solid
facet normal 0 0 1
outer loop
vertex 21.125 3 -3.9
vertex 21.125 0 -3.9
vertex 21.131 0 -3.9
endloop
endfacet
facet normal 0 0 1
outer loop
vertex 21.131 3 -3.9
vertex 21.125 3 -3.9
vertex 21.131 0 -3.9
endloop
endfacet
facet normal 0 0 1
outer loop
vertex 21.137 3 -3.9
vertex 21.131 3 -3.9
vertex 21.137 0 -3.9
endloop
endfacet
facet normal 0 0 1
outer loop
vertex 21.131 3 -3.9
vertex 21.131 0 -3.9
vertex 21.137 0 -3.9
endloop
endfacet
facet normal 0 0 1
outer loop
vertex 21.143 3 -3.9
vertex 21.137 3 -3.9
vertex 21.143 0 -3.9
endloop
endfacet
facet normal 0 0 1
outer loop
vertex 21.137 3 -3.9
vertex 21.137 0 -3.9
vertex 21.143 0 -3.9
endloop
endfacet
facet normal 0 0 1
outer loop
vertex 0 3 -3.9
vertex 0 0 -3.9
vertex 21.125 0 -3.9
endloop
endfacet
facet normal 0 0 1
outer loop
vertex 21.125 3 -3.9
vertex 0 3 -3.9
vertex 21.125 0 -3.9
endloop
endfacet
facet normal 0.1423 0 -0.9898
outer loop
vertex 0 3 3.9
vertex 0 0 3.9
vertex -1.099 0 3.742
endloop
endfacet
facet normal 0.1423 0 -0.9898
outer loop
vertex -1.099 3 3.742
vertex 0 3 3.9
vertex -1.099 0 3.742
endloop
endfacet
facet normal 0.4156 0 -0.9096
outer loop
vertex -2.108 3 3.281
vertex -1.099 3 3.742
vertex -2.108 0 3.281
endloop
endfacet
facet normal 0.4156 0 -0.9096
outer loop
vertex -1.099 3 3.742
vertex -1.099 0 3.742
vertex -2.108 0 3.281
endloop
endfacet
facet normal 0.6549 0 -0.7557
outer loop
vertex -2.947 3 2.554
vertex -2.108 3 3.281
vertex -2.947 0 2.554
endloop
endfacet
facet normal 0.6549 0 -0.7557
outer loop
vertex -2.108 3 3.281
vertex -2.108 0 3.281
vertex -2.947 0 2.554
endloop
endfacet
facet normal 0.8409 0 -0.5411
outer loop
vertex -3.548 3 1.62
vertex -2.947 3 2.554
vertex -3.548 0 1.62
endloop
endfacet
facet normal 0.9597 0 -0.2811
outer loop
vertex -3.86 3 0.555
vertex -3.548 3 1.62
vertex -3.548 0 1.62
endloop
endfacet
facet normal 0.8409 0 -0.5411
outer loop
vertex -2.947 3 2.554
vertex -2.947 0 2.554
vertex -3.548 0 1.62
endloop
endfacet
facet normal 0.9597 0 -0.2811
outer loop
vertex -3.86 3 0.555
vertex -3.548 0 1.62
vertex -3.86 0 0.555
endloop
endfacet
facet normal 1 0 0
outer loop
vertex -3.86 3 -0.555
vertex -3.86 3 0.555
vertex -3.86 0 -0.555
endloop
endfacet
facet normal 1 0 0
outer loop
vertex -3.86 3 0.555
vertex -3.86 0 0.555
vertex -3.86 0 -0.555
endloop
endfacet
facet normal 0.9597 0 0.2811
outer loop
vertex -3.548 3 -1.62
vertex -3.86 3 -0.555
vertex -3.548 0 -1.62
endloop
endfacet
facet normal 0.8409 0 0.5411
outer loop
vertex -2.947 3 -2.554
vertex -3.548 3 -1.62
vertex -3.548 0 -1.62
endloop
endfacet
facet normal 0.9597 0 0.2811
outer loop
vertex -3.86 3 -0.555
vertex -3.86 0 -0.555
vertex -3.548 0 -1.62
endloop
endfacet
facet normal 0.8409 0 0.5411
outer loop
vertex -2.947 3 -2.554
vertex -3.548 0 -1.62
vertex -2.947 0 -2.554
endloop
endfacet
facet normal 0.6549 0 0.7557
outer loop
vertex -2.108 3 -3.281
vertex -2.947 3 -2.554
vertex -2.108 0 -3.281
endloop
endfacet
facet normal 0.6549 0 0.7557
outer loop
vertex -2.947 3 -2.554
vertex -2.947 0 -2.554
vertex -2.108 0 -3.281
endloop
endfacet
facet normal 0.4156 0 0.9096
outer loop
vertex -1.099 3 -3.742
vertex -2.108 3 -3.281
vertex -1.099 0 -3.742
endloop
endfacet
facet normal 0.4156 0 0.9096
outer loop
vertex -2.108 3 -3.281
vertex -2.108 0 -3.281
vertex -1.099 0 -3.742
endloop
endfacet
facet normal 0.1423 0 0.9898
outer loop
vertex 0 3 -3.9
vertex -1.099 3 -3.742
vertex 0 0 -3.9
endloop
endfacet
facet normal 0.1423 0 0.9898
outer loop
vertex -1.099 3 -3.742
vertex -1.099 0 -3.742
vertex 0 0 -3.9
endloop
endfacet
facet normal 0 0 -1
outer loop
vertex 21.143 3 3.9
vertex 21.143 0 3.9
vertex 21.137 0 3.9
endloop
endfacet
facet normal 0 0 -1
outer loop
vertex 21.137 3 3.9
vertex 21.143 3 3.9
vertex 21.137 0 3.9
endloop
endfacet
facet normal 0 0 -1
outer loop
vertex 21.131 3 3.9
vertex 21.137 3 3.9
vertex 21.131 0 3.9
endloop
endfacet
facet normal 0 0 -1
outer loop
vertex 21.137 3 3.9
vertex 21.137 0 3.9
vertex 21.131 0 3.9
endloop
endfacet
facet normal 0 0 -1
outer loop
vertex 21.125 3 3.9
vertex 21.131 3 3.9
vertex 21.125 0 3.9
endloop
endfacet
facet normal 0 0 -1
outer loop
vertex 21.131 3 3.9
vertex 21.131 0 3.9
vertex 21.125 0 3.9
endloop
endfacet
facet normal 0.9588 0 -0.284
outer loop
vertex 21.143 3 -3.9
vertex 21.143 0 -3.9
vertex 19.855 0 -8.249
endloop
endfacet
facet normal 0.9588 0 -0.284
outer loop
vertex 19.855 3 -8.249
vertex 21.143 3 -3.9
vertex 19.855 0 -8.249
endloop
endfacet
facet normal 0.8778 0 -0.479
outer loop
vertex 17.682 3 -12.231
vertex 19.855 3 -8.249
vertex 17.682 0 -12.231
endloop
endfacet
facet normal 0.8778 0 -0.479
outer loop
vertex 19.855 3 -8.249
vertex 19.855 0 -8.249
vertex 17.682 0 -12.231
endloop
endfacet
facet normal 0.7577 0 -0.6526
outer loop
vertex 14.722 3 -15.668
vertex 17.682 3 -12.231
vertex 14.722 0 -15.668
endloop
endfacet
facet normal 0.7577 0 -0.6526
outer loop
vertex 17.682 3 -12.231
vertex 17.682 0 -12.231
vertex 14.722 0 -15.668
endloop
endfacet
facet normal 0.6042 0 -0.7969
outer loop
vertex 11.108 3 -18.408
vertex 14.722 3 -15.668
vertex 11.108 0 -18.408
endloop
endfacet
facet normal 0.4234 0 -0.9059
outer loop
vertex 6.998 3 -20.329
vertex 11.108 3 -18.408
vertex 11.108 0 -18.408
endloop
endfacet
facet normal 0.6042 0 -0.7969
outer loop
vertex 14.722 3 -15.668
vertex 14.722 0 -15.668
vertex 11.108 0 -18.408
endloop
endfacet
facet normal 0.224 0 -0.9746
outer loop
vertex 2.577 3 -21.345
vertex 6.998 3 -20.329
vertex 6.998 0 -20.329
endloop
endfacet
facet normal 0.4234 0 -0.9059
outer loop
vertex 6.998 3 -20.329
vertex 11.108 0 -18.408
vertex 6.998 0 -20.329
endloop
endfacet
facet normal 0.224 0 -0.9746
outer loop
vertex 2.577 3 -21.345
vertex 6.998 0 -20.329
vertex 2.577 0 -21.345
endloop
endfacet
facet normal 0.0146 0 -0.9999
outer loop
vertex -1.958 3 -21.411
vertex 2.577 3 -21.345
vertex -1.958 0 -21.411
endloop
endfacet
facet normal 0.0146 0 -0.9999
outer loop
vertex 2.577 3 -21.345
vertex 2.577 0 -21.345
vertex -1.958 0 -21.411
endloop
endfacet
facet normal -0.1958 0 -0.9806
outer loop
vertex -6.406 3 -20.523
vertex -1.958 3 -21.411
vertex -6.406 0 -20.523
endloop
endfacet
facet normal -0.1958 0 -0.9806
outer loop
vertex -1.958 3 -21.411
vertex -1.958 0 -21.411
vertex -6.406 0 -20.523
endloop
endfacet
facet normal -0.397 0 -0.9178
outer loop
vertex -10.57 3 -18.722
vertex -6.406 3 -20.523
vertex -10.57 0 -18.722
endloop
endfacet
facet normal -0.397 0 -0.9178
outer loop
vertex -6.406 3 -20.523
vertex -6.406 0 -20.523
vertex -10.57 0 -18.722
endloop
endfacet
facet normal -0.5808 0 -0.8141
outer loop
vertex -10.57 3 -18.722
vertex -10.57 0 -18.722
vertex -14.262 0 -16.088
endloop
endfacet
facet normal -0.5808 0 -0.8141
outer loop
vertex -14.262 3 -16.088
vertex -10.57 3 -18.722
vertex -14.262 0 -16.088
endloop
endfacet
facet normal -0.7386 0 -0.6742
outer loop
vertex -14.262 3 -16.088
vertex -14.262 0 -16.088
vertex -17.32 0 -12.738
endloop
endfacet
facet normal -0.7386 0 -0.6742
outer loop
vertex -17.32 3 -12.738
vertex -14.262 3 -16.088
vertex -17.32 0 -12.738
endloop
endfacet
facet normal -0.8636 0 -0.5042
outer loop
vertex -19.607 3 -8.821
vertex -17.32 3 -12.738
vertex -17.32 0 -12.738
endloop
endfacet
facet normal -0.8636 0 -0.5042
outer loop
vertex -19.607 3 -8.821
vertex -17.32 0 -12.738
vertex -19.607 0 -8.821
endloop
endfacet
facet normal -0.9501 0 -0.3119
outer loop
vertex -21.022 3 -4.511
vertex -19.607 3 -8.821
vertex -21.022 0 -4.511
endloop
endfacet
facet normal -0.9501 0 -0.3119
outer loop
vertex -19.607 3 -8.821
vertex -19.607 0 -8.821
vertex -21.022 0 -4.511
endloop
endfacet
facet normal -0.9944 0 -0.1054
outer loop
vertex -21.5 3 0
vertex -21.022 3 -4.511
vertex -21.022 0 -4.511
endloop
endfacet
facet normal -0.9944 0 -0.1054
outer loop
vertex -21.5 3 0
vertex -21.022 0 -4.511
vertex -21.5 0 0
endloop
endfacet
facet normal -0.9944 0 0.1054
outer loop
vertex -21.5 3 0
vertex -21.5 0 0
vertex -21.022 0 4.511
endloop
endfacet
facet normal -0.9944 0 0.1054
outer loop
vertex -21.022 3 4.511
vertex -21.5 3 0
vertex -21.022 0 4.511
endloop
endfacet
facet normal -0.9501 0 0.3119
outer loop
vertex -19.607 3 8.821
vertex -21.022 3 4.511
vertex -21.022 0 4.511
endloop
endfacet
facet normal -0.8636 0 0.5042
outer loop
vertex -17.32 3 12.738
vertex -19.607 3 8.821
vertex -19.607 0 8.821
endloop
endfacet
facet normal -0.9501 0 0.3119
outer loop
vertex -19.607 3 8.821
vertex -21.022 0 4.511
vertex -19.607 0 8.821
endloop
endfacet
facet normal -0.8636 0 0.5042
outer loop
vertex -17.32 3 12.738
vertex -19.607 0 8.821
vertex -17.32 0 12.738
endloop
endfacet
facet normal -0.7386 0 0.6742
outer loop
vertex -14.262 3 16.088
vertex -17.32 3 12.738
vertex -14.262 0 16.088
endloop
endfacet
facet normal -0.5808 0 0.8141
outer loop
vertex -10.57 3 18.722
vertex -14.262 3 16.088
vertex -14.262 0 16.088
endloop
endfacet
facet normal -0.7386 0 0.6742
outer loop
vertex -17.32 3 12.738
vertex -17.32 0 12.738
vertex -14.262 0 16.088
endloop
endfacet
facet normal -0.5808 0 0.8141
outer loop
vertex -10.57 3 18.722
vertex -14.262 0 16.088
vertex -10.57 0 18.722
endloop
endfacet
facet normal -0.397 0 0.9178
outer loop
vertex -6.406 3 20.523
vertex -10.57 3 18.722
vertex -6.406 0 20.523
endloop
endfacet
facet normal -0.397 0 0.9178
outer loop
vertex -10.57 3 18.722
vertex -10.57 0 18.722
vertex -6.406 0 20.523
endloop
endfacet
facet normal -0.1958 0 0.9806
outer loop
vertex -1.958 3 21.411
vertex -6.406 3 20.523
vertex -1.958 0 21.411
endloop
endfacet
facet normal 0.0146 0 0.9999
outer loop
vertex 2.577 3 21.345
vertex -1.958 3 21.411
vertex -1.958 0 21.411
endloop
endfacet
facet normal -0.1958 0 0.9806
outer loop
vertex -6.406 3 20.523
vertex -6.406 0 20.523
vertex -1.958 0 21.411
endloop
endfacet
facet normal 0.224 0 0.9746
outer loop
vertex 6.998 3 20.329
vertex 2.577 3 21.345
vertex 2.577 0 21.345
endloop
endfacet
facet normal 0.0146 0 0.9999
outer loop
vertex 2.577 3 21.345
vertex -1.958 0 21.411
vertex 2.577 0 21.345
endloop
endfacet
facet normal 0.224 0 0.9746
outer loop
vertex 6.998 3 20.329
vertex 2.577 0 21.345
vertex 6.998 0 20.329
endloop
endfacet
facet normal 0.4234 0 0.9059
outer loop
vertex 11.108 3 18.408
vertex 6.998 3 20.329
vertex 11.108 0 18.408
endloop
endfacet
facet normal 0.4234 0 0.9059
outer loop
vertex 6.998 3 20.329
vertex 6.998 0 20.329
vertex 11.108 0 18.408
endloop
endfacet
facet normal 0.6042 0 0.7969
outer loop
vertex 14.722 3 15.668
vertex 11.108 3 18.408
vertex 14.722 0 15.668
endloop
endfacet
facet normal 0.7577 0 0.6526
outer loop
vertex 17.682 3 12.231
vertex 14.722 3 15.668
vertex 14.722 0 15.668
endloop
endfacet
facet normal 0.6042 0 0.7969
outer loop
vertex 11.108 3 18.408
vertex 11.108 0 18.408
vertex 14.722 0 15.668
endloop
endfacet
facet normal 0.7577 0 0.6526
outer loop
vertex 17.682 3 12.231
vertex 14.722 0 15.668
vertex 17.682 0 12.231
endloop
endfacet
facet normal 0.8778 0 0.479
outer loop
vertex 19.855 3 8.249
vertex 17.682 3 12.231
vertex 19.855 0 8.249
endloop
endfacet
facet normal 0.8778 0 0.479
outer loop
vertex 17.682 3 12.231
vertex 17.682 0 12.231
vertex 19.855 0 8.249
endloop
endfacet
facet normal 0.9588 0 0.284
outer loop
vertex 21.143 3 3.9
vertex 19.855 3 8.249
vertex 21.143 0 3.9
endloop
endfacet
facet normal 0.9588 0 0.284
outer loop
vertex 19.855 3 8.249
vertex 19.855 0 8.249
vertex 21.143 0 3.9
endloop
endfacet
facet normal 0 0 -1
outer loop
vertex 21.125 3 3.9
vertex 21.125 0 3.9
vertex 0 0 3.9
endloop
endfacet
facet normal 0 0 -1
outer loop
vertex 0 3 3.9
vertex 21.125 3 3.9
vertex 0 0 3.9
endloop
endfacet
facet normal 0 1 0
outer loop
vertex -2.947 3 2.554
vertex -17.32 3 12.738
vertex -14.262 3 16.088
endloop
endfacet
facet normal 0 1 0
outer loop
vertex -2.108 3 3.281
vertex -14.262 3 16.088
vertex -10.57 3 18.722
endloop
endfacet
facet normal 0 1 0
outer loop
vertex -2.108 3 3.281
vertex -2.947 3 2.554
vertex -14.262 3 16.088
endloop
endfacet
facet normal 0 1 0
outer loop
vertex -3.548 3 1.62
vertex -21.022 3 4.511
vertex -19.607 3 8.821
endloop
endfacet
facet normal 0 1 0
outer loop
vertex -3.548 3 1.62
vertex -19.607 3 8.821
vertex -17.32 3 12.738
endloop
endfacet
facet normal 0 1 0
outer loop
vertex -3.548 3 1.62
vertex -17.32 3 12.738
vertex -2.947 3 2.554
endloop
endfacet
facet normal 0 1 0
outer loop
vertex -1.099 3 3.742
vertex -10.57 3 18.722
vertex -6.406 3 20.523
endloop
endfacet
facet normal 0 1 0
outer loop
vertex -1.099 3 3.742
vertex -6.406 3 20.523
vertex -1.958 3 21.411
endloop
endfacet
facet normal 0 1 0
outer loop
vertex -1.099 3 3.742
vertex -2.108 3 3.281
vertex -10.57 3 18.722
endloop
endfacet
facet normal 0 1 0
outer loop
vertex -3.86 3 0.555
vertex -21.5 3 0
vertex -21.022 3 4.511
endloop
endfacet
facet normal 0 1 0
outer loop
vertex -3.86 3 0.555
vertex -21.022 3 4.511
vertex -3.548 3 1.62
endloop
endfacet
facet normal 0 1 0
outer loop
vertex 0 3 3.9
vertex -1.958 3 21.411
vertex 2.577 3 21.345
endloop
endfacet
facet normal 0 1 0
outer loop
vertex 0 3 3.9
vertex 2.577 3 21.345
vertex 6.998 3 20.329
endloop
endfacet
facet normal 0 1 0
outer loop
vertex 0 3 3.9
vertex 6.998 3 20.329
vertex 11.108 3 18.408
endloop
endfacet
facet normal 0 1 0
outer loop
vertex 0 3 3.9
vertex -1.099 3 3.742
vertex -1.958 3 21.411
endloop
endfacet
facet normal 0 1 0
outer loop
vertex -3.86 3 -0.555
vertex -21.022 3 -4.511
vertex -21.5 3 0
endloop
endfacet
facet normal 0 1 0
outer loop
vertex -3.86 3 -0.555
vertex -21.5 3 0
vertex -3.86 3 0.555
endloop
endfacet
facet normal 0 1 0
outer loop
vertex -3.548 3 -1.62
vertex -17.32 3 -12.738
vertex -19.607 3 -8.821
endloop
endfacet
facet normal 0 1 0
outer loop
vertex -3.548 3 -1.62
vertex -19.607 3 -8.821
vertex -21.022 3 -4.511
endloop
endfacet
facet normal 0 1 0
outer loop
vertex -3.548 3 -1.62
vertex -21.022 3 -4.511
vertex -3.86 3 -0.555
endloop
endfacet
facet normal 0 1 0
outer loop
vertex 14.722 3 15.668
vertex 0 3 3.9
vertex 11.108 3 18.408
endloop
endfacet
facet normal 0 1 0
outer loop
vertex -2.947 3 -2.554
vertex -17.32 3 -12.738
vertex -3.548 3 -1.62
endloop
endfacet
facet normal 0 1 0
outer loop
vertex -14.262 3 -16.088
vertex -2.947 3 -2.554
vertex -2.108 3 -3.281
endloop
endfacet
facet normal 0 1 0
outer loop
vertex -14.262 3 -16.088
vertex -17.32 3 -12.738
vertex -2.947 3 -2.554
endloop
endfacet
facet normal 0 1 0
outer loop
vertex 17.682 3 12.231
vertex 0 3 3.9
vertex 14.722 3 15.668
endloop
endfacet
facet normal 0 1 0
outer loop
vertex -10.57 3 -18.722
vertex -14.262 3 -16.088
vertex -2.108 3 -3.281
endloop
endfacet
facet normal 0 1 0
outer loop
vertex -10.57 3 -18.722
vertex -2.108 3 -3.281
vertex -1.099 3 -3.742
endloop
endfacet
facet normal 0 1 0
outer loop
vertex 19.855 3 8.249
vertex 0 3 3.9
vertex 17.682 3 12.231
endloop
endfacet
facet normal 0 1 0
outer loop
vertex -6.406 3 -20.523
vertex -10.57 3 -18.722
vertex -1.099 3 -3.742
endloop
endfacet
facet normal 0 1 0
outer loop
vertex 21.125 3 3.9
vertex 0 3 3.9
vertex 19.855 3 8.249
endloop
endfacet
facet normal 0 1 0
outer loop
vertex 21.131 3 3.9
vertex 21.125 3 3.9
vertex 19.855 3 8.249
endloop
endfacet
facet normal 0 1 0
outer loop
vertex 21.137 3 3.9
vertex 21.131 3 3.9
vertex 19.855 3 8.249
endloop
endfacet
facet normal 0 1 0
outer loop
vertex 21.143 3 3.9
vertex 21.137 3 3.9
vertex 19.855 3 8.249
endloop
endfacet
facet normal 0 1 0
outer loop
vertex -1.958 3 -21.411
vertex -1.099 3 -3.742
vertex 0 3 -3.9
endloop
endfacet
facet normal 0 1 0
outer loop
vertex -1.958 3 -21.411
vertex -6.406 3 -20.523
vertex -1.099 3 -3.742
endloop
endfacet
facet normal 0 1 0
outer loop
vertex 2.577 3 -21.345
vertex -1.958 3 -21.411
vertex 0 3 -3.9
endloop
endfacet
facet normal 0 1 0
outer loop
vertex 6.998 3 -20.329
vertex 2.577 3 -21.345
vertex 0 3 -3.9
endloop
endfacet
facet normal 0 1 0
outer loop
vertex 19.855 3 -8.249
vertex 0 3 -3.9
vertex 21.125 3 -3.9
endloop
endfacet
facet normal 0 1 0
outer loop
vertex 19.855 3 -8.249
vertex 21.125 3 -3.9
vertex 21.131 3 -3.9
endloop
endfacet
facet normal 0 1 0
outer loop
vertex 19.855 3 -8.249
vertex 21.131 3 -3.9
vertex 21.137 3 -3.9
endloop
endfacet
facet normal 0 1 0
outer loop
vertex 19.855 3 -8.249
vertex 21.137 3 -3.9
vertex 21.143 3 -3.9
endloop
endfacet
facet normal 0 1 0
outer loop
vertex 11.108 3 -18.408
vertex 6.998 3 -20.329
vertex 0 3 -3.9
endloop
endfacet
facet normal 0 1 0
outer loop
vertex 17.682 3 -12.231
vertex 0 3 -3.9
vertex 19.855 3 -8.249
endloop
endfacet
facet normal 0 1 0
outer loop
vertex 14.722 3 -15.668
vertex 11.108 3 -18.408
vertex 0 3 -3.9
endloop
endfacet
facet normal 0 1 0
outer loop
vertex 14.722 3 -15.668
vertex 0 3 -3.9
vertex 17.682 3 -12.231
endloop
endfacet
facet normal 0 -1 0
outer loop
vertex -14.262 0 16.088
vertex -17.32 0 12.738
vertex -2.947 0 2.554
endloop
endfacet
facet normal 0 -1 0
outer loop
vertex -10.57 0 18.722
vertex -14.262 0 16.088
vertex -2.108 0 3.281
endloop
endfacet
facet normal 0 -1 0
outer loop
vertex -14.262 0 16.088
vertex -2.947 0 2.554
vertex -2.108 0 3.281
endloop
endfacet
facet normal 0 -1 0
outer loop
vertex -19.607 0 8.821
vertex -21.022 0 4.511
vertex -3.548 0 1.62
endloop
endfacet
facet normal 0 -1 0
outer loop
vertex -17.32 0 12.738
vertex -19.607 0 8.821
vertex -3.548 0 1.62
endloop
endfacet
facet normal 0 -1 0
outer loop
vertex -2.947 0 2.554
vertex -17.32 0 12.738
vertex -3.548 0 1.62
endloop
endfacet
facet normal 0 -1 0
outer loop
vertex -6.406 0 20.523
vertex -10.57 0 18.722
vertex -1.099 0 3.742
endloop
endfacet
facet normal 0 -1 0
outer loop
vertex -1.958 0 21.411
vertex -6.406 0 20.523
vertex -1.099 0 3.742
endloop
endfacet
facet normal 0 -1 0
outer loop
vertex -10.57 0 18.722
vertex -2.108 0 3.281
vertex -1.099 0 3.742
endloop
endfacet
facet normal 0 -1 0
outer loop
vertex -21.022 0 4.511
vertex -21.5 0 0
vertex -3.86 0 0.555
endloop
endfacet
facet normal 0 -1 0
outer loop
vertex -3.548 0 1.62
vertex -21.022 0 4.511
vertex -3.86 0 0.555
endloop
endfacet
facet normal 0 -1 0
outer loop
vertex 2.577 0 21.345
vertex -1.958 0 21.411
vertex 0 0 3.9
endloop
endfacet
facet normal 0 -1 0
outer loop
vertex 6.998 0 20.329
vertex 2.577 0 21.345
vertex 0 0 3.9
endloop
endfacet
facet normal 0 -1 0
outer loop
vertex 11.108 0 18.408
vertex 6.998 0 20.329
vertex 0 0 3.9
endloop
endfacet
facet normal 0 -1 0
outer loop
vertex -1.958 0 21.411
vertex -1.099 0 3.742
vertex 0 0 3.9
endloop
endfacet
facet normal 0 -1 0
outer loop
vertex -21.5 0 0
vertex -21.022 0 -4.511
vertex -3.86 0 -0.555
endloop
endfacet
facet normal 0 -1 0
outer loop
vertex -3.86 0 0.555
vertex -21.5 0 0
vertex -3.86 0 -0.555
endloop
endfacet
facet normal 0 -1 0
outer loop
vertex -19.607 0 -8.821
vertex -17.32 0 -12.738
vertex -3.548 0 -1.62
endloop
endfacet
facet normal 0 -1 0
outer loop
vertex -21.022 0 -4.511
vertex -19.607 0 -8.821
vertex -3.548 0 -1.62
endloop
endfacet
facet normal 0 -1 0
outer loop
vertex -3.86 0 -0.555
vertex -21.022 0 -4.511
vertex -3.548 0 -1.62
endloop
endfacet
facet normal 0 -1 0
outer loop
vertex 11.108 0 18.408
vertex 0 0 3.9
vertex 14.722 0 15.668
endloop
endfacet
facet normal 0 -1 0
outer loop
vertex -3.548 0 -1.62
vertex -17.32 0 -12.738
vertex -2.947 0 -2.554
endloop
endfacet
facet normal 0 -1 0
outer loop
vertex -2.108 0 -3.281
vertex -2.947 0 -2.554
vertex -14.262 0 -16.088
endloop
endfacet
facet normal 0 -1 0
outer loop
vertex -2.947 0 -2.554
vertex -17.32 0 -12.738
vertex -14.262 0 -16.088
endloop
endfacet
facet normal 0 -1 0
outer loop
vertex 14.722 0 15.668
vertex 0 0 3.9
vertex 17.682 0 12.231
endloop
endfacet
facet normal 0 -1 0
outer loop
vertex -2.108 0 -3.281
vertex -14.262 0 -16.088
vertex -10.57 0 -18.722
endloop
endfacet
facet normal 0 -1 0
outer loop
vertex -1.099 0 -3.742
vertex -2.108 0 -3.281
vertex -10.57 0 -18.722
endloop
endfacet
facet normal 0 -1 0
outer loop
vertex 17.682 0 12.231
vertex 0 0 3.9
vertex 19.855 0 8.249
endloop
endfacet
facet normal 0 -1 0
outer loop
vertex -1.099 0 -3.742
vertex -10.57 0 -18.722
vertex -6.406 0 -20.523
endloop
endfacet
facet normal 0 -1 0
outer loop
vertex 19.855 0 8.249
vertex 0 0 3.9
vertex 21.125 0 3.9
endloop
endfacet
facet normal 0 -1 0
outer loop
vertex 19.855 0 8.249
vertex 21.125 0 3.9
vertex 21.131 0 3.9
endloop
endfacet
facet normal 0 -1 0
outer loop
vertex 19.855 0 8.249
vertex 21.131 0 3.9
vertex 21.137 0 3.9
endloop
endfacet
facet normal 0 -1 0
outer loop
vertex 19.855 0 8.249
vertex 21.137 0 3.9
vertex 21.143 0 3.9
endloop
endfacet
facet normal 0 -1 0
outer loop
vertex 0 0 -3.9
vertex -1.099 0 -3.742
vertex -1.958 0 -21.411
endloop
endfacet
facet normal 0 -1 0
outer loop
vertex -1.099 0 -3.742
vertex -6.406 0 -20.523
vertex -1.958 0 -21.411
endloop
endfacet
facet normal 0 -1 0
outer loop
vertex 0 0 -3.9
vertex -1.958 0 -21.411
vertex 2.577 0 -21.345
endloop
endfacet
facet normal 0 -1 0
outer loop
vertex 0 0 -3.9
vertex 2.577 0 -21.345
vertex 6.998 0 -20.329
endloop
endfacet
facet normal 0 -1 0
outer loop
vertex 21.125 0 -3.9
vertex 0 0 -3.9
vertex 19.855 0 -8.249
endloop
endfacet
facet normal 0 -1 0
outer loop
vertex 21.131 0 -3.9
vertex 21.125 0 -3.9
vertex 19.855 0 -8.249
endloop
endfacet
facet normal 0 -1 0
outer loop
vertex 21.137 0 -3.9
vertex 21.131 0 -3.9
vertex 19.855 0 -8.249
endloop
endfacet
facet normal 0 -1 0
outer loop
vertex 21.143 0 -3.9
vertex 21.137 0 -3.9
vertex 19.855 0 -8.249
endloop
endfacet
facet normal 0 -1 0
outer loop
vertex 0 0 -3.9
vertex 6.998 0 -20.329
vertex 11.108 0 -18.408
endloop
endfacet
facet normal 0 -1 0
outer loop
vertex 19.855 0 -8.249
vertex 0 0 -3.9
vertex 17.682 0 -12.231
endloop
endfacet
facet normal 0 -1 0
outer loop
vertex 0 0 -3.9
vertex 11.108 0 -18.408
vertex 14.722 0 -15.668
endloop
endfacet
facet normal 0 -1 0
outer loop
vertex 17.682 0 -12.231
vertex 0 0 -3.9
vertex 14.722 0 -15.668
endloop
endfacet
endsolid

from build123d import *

# Parameters (mm, degrees)
BOSS_EXTRUDE1_DEPTH = 3


with BuildPart() as part:
    # Sketch1 → Boss-Extrude1 (new body)
    with BuildSketch(Plane(origin=(0, 0, 0), x_dir=(1, 0, 0), z_dir=(0, 1, 0))):
        with BuildLine():
            Line((21.125095664, -3.9), (0, -3.9))
            ThreePointArc((0, -3.9), (-3.9, 0), (0, 3.9))
            Line((0, 3.9), (21.125095664, 3.9))
            ThreePointArc((21.125095664, 3.9), (21.134212017, 3.899989345), (21.14332832, 3.899957381))
            ThreePointArc((21.14332832, 3.899957381), (-21.5, 0), (21.14332832, -3.899957381))
            ThreePointArc((21.14332832, -3.899957381), (21.134212017, -3.899989345), (21.125095664, -3.9))
        make_face()
    extrude(amount=BOSS_EXTRUDE1_DEPTH)


solid = part.part
